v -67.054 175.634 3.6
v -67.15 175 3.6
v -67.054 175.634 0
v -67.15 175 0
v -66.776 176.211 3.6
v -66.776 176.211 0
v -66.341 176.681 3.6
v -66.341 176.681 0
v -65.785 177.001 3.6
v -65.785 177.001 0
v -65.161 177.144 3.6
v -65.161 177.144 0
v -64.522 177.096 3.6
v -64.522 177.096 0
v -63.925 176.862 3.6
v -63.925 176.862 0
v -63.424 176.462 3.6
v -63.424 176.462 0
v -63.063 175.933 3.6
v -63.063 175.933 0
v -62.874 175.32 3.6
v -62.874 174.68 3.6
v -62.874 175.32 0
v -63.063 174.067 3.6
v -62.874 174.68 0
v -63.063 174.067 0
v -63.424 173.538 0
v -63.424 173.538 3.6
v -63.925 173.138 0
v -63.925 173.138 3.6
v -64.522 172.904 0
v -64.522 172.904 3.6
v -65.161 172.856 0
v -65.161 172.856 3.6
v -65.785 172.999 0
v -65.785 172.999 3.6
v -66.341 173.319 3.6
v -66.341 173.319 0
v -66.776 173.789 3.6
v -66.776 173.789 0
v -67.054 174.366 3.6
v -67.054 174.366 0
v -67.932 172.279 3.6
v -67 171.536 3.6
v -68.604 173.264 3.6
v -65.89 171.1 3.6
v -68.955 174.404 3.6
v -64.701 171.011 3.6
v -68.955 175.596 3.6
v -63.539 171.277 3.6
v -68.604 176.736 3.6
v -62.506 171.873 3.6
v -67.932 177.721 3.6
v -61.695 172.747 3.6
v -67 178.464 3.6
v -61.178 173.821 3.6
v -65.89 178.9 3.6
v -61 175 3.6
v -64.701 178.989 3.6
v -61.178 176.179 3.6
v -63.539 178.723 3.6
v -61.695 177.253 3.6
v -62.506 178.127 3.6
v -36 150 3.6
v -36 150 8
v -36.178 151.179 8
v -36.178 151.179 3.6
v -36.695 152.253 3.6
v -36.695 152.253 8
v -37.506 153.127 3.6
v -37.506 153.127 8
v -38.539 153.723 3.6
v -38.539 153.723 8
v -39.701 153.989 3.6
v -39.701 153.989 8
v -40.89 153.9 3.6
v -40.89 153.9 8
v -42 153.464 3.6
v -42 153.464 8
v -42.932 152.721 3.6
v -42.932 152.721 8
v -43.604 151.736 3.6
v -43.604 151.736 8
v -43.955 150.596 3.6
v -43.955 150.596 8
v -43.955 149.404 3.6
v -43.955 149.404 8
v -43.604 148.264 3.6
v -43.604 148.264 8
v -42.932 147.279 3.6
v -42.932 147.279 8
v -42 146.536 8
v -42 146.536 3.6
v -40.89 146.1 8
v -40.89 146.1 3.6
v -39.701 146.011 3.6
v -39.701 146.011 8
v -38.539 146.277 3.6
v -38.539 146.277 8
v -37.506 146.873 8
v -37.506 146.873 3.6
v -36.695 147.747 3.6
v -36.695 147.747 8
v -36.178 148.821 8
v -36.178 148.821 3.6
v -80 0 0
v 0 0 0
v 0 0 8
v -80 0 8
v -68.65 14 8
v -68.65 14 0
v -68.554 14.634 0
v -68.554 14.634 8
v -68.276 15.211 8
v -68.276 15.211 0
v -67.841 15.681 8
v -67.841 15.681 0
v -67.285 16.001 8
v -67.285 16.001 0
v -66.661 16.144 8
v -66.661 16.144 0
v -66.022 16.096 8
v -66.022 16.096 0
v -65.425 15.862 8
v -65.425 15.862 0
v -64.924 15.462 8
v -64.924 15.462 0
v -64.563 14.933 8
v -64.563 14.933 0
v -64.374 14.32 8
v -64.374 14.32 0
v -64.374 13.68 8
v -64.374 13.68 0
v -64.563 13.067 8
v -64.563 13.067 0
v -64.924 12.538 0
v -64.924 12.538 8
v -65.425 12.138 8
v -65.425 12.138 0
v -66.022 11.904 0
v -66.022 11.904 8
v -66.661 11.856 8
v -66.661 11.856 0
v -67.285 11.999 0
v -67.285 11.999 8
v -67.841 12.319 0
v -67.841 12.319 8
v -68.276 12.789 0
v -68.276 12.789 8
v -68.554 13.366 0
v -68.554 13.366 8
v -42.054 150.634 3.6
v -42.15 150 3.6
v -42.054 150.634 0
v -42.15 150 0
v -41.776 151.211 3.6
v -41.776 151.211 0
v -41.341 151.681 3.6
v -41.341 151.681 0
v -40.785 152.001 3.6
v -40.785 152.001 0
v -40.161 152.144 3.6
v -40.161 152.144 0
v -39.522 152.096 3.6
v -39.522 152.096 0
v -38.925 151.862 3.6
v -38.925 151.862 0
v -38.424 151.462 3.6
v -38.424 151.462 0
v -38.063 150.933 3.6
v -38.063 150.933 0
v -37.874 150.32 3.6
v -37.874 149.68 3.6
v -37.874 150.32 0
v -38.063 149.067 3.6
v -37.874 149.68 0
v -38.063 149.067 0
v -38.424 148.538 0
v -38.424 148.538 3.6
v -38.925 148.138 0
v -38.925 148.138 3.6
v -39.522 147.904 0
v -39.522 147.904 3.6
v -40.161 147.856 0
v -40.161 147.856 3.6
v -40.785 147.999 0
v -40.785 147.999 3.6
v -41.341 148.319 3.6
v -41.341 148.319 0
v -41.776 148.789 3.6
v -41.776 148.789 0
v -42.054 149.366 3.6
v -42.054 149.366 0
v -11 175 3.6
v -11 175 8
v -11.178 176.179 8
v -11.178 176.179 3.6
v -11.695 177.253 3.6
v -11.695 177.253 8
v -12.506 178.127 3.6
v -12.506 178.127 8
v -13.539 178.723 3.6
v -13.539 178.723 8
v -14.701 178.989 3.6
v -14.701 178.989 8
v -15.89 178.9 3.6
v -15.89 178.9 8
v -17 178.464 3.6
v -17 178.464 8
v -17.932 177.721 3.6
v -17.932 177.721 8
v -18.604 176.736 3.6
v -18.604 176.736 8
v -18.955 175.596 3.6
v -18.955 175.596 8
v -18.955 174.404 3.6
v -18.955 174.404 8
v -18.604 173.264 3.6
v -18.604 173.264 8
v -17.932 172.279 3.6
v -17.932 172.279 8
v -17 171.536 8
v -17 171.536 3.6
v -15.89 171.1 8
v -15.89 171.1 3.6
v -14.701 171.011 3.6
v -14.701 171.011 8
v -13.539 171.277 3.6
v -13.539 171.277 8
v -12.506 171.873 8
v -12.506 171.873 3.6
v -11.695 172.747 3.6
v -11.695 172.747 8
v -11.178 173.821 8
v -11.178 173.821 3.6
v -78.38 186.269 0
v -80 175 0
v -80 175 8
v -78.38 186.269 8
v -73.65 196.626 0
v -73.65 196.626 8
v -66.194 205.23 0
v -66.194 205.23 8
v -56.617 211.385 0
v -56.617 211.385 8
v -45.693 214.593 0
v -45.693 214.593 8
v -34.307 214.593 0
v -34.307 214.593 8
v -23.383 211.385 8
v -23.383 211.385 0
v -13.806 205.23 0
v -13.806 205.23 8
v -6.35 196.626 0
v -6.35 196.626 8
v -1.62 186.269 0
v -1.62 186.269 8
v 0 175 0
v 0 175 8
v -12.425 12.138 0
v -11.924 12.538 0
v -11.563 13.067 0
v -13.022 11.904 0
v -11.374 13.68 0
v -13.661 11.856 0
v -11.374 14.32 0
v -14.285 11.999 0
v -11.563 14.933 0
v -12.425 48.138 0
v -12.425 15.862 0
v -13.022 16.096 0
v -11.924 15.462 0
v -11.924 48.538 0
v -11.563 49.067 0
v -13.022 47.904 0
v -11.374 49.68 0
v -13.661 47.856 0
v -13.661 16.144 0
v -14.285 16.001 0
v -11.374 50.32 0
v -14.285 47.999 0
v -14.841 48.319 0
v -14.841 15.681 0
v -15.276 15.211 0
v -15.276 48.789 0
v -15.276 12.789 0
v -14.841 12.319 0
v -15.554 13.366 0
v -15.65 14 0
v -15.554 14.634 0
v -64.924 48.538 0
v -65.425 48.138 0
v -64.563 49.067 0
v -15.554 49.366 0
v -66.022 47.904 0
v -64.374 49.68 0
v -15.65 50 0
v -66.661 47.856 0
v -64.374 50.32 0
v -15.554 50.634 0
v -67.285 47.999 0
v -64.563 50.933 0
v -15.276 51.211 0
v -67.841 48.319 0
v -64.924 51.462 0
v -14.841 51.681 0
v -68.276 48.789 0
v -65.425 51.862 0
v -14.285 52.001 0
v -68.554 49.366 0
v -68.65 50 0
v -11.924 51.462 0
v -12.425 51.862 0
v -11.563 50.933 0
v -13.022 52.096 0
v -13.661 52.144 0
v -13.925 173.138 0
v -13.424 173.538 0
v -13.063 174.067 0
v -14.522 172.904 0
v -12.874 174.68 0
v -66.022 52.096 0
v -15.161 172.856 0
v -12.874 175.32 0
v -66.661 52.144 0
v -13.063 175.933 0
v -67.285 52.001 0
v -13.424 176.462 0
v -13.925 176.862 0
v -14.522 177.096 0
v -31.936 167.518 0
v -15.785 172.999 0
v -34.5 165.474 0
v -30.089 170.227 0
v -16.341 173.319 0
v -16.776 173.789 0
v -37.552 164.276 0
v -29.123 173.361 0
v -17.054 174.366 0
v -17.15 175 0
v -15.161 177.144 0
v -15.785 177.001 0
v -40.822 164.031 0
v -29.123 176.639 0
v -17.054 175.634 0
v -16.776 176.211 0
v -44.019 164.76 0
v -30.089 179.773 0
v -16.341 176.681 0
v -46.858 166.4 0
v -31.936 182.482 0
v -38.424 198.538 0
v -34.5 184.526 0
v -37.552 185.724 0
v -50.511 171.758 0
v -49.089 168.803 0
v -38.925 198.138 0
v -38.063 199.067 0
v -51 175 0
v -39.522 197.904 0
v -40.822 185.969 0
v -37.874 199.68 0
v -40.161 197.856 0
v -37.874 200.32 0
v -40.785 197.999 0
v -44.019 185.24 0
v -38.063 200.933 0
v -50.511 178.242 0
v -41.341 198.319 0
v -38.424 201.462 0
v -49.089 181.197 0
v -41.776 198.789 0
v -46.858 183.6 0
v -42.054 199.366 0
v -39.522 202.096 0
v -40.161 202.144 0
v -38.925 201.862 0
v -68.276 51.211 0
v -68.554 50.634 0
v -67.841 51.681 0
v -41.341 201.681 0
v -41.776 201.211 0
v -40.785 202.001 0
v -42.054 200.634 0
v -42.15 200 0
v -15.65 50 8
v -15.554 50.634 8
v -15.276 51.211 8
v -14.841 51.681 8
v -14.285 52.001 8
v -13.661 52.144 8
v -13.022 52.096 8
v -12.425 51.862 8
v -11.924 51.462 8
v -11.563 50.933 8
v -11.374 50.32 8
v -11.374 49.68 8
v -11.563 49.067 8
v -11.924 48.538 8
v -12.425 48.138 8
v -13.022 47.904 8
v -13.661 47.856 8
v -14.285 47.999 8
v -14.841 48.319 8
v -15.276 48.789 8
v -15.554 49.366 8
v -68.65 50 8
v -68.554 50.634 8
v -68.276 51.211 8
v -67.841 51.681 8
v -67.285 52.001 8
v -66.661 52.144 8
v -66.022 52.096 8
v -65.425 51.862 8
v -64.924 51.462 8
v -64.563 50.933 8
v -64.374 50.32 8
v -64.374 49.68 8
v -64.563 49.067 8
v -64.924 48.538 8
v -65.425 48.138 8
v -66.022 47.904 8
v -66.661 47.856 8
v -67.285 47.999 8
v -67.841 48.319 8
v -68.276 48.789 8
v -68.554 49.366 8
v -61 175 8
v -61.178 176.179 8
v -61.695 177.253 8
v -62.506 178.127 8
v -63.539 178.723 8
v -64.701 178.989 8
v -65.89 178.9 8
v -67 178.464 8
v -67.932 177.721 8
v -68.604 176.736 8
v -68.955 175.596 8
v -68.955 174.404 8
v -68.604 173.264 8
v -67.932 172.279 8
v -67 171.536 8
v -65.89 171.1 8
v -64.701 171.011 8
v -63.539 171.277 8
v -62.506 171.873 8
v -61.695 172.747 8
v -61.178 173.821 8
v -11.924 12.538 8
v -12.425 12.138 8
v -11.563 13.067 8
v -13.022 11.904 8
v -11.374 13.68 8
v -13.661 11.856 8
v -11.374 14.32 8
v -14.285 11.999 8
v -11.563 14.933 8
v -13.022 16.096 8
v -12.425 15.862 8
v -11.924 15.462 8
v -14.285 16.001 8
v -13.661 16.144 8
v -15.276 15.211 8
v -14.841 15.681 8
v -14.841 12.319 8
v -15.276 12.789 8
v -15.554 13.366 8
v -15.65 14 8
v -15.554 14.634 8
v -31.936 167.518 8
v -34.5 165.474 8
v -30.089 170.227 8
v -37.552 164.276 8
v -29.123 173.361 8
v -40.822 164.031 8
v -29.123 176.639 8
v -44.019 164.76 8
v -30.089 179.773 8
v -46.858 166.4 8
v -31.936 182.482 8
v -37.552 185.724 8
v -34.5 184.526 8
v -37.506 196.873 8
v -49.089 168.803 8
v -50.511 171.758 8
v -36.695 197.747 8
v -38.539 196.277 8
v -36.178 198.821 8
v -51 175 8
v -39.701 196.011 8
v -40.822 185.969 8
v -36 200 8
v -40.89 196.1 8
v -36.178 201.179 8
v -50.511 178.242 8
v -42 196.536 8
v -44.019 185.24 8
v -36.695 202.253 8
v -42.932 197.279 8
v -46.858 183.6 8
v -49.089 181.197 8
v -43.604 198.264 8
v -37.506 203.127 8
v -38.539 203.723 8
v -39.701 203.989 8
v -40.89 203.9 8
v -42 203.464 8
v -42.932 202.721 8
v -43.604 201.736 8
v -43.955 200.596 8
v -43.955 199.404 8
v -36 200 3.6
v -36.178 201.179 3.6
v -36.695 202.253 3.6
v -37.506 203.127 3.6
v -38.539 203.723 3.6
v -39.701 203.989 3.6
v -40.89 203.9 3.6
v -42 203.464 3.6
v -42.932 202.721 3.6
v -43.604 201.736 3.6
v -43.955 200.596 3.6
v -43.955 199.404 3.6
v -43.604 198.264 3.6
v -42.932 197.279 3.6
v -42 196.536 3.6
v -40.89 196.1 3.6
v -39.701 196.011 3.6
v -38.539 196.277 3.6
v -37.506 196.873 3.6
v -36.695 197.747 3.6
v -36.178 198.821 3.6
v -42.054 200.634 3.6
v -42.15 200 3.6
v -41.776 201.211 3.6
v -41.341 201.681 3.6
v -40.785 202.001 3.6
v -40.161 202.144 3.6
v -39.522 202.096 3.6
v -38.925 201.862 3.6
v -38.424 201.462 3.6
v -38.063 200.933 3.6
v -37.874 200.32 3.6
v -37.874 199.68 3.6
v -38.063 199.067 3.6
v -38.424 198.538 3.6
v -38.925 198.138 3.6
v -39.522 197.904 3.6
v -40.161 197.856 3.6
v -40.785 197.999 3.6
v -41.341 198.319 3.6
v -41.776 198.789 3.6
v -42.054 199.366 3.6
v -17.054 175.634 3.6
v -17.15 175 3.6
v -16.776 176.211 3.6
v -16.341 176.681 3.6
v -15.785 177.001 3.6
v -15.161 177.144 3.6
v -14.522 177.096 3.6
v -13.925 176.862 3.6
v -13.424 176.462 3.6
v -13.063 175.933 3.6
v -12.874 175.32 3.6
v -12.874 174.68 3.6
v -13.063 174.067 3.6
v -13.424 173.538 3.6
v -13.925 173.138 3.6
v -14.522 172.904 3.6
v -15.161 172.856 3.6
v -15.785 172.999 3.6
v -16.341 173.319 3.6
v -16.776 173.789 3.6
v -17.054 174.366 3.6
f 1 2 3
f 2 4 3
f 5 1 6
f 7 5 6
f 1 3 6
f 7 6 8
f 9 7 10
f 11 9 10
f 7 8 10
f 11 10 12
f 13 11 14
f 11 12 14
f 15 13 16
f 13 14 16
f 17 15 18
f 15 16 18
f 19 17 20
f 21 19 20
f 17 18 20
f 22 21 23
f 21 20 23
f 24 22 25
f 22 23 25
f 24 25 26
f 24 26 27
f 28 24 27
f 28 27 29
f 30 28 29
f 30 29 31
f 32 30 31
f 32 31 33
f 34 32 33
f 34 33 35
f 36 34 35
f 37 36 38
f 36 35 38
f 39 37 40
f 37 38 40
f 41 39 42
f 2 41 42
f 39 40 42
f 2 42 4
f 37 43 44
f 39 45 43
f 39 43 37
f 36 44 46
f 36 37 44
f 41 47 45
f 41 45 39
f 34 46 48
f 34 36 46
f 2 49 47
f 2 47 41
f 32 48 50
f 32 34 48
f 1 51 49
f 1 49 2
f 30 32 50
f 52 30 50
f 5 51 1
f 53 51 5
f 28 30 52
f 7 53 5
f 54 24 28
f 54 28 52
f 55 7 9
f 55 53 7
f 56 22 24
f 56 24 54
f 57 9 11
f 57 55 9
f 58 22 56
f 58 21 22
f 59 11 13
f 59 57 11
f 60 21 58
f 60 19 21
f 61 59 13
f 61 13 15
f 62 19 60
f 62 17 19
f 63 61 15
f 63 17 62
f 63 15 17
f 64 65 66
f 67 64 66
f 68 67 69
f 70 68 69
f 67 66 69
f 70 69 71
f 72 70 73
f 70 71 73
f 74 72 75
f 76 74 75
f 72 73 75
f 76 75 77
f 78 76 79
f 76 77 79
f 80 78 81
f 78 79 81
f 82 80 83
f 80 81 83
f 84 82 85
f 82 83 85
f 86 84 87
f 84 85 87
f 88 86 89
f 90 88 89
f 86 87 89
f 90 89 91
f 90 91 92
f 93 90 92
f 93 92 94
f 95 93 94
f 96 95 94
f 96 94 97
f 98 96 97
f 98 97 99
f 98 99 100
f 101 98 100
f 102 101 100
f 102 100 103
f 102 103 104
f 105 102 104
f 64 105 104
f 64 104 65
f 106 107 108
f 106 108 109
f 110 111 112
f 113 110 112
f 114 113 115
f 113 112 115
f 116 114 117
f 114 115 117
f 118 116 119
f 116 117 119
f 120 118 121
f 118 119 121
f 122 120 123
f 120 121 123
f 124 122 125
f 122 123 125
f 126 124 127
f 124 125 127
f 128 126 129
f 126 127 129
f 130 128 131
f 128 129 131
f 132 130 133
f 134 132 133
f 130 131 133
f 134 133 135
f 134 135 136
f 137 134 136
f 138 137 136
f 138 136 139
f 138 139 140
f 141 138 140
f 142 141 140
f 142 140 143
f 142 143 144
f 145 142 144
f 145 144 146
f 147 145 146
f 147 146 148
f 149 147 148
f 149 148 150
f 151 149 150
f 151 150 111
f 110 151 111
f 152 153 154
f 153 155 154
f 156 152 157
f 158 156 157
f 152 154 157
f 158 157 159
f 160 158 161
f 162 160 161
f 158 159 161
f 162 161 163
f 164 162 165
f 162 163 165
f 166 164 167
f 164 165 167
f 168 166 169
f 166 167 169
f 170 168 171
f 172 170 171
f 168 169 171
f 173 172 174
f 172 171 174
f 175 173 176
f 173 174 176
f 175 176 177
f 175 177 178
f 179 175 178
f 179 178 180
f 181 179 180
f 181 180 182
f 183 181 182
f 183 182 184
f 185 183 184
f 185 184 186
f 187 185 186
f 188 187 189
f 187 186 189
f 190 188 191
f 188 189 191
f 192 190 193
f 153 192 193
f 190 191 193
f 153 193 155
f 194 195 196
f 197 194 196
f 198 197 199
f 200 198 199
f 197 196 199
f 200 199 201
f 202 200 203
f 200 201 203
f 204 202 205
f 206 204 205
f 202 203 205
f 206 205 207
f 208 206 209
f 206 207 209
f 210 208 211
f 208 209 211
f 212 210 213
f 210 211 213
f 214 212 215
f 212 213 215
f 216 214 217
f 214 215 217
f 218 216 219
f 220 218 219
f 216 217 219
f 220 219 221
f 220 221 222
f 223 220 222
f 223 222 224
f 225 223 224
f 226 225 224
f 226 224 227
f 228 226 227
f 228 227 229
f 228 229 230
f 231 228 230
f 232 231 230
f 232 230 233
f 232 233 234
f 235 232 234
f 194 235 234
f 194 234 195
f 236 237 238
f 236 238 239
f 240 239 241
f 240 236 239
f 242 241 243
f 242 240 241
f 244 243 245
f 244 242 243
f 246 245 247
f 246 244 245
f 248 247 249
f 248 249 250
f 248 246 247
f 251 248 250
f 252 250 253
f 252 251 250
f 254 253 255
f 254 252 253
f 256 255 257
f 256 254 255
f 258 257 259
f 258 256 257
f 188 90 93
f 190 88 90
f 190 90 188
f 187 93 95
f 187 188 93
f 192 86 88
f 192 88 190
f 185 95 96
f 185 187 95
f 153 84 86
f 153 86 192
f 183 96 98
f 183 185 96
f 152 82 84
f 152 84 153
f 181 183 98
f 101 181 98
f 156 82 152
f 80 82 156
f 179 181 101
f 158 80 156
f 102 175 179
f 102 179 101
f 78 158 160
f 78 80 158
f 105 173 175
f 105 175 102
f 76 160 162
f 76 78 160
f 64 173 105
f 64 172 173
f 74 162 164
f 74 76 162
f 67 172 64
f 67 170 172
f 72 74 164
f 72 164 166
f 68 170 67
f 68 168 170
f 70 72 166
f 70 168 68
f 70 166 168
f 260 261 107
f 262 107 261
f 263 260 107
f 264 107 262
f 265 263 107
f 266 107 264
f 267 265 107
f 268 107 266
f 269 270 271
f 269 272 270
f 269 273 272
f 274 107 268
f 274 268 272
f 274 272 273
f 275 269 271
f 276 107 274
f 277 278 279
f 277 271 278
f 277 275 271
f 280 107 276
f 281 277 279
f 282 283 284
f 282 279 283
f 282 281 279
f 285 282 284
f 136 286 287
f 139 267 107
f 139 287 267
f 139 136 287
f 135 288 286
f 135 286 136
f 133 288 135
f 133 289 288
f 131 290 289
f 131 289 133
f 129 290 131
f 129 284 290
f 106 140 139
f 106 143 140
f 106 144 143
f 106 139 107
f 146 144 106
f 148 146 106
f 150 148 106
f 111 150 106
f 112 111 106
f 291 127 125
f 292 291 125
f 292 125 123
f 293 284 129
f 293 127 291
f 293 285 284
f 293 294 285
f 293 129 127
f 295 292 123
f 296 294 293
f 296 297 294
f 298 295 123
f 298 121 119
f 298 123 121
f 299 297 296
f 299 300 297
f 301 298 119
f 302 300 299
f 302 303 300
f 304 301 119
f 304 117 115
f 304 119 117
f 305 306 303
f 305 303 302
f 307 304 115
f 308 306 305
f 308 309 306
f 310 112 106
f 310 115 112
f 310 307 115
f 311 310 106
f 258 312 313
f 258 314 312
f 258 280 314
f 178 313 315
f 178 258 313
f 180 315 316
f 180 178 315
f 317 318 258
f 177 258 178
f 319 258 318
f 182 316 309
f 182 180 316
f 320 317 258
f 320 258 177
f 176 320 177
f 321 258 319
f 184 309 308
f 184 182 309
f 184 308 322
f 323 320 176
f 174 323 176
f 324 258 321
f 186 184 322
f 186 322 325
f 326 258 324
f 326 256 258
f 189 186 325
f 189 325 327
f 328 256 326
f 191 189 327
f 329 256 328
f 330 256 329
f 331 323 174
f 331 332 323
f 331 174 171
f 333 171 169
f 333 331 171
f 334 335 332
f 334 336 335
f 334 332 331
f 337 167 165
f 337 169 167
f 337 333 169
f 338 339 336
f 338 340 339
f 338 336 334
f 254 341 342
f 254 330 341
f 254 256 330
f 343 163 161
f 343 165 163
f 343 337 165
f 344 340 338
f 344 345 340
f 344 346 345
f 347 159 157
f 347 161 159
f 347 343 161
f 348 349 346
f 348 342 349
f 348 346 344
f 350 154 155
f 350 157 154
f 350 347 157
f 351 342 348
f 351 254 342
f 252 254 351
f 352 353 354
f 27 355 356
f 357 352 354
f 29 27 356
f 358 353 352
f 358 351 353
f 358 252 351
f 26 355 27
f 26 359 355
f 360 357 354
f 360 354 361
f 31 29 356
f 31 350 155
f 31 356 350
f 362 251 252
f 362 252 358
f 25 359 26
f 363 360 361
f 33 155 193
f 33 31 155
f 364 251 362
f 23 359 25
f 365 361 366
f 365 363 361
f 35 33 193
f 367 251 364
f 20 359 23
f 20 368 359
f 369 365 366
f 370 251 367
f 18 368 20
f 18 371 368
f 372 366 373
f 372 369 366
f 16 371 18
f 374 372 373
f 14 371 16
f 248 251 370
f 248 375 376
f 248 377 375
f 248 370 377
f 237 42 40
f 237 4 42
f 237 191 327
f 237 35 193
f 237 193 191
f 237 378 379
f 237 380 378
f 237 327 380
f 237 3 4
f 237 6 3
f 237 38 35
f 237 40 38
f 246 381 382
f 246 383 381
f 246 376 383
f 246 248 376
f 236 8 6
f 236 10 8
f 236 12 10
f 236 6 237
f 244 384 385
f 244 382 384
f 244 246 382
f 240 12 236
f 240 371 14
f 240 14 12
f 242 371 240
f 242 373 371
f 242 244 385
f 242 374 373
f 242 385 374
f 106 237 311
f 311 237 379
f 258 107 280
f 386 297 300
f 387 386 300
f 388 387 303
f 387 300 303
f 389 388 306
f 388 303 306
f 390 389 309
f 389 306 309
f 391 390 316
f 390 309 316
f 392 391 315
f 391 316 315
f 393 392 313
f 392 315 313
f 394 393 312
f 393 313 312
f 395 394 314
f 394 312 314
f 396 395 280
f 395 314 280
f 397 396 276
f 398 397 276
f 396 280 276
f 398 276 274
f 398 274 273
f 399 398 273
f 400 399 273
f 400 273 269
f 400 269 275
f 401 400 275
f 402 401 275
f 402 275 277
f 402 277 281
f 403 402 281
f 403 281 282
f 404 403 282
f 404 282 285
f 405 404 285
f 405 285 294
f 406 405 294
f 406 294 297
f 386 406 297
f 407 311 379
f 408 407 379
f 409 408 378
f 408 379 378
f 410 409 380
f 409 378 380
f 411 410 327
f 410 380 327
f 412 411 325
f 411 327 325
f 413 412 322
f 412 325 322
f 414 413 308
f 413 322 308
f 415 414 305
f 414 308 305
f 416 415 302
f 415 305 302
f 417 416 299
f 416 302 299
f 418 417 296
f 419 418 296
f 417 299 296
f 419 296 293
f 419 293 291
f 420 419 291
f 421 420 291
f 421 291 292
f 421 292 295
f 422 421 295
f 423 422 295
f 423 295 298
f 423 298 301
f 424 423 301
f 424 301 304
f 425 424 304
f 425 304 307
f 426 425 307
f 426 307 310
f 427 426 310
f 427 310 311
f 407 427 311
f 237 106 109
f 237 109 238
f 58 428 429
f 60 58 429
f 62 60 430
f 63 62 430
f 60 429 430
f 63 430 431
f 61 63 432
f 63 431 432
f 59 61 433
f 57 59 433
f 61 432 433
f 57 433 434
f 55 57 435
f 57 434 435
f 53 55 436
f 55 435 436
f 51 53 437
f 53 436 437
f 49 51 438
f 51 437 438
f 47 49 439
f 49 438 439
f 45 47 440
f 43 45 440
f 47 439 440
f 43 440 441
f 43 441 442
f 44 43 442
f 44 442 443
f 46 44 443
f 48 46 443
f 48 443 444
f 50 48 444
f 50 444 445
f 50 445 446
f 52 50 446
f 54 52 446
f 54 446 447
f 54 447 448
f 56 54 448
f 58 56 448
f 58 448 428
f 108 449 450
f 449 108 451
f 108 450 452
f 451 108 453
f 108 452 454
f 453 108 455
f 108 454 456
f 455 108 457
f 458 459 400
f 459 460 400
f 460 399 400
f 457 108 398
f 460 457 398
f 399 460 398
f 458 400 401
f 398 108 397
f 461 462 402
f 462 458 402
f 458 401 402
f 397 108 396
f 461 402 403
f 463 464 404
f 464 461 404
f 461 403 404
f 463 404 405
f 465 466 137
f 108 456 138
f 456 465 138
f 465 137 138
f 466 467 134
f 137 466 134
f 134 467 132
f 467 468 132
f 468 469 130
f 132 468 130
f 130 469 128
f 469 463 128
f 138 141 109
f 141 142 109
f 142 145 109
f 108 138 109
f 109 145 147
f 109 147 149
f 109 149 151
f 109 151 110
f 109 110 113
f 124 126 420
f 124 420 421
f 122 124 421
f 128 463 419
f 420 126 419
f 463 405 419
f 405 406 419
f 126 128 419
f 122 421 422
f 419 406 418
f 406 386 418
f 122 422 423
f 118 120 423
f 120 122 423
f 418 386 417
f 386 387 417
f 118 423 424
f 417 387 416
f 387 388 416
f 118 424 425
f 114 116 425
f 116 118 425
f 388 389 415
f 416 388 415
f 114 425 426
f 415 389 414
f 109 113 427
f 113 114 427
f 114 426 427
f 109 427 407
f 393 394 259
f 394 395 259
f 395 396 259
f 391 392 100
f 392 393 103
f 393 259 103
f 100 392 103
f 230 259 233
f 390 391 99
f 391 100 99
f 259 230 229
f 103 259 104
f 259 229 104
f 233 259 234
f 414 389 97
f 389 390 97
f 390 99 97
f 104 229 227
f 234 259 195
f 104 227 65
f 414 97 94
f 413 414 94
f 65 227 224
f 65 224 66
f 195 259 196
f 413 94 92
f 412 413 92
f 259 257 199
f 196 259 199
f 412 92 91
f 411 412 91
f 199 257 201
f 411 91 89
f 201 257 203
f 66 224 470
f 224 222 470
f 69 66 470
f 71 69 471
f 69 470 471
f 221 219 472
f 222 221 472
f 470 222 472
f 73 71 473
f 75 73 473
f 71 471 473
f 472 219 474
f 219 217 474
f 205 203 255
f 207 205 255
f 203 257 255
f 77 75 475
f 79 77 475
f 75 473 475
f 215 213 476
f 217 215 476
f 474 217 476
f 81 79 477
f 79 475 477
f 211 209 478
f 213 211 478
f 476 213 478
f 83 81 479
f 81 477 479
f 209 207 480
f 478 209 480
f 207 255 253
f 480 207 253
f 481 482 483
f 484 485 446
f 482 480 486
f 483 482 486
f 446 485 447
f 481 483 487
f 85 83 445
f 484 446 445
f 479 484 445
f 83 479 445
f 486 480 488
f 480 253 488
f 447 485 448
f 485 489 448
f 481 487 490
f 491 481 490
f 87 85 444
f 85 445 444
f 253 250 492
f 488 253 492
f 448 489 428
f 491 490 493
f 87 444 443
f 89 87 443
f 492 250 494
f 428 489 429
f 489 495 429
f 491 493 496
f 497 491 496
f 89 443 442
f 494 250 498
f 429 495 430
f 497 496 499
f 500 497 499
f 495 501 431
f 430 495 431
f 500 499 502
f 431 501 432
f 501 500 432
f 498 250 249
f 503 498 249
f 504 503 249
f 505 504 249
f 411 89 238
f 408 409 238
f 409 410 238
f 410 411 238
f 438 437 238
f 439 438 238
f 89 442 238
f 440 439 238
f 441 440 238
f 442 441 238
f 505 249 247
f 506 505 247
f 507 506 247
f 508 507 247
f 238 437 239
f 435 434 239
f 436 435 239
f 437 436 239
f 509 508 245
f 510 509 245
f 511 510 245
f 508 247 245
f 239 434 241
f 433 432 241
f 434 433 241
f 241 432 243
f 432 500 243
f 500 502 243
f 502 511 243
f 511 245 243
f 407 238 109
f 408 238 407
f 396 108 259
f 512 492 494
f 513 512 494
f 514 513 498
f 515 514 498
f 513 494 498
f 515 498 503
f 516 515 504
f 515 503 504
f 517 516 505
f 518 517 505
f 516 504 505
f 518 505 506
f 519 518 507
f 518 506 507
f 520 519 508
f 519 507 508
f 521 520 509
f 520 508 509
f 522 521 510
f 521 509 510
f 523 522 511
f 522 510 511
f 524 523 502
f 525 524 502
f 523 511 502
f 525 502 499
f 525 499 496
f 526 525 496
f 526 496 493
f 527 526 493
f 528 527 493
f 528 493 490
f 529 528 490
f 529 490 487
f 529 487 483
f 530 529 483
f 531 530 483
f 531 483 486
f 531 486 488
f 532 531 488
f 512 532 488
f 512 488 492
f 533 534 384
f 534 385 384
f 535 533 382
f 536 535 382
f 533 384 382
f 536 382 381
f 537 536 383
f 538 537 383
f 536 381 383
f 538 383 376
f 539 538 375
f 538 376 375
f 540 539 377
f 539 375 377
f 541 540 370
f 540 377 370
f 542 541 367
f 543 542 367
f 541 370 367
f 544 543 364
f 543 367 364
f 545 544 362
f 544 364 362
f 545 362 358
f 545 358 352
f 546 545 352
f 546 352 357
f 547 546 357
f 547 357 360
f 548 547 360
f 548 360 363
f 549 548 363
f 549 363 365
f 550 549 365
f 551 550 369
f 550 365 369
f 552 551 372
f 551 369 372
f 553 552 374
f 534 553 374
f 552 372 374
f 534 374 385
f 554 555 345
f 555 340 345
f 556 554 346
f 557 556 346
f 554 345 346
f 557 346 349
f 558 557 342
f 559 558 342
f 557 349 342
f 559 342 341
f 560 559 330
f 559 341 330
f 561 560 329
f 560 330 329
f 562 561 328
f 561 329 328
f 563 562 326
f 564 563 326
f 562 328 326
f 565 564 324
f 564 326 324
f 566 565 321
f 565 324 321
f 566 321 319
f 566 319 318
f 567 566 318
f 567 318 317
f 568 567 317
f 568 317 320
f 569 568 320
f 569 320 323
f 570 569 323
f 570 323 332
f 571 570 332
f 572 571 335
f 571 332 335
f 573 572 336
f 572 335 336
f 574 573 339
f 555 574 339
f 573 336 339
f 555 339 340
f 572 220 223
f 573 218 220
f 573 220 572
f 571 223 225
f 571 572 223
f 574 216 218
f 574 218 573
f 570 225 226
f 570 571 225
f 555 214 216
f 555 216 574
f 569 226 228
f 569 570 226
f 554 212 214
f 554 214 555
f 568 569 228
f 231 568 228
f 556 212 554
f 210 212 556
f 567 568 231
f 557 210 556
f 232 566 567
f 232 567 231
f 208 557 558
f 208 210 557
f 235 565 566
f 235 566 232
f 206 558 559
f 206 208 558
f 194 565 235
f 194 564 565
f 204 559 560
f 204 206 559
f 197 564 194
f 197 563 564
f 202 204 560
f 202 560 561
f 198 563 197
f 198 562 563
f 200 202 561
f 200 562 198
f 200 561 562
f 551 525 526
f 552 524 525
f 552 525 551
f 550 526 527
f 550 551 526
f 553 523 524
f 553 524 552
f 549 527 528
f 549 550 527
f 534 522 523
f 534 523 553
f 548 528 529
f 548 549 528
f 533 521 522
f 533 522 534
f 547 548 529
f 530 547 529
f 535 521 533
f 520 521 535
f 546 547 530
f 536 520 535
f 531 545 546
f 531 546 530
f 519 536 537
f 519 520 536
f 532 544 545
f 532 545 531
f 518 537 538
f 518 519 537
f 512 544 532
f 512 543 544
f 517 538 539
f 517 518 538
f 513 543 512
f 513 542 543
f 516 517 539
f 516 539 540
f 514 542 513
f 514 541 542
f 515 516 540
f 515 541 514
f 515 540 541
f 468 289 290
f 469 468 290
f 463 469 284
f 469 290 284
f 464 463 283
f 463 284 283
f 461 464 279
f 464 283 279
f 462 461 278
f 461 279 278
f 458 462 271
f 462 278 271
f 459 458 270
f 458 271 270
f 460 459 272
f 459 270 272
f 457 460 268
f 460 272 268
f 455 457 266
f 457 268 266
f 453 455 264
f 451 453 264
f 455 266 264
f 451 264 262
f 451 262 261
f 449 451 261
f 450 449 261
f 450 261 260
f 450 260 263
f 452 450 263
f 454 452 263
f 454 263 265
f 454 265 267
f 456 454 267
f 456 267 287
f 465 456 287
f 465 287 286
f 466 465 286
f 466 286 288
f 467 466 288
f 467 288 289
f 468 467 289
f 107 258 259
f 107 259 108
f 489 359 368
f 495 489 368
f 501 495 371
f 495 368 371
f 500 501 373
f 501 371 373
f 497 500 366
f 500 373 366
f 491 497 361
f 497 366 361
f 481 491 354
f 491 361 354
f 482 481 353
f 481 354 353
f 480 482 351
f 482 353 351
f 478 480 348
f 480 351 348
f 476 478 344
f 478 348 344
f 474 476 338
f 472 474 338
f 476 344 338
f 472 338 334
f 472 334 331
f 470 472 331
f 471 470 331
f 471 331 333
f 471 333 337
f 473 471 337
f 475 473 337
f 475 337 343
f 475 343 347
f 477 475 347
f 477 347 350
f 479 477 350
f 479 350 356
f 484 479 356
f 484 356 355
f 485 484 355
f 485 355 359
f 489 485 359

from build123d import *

# Parameters (mm, degrees)
SKETCH1_R                                           = 8
BOSS_EXTRUDE1_DEPTH                                 = 8
CBORE_FOR_M4_HEX_SOCKET_HEAD_CAP_SCREW2_D           = 4.3
CBORE_FOR_M4_HEX_SOCKET_HEAD_CAP_SCREW2_CBORE_D     = 8
CBORE_FOR_M4_HEX_SOCKET_HEAD_CAP_SCREW2_CBORE_DEPTH = 4.4
F_20_0MM_TRANSITIONAL_DOWEL_HOLE1_D                 = 22
M4_CLEARANCE_HOLE2_D                                = 4.3


with BuildPart() as part:
    # Sketch1 → Boss-Extrude1 (new body)
    with BuildSketch(Plane.XY):
        with BuildLine():
            Line((0, 0), (-80, 0))
            Line((-80, 0), (-80, 175))
            ThreePointArc((-80, 175), (-40, 215), (0, 175))
            Line((0, 175), (0, 0))
        make_face()
        with Locations((-40, 175)):
            Circle(SKETCH1_R, mode=Mode.SUBTRACT)
    extrude(amount=BOSS_EXTRUDE1_DEPTH)

    # CBORE for M4 Hex Socket Head Cap Screw2 (through all)
    with Locations(Plane.XY.offset(8)):
        with Locations((-40, 200), (-15, 175), (-40, 150), (-65, 175)):
            CounterBoreHole(CBORE_FOR_M4_HEX_SOCKET_HEAD_CAP_SCREW2_D / 2, CBORE_FOR_M4_HEX_SOCKET_HEAD_CAP_SCREW2_CBORE_D / 2, CBORE_FOR_M4_HEX_SOCKET_HEAD_CAP_SCREW2_CBORE_DEPTH)

    # Ø20.0mm Transitional Dowel Hole1 (through all)
    with Locations(Plane.XY.offset(8)):
        with Locations((-40, 175)):
            Hole(F_20_0MM_TRANSITIONAL_DOWEL_HOLE1_D / 2)

    # M4 Clearance Hole2 (through all)
    with Locations(Plane.XY.offset(8)):
        with Locations((-66.5, 50), (-13.5, 14), (-66.5, 14), (-13.5, 50)):
            Hole(M4_CLEARANCE_HOLE2_D / 2)


solid = part.part
